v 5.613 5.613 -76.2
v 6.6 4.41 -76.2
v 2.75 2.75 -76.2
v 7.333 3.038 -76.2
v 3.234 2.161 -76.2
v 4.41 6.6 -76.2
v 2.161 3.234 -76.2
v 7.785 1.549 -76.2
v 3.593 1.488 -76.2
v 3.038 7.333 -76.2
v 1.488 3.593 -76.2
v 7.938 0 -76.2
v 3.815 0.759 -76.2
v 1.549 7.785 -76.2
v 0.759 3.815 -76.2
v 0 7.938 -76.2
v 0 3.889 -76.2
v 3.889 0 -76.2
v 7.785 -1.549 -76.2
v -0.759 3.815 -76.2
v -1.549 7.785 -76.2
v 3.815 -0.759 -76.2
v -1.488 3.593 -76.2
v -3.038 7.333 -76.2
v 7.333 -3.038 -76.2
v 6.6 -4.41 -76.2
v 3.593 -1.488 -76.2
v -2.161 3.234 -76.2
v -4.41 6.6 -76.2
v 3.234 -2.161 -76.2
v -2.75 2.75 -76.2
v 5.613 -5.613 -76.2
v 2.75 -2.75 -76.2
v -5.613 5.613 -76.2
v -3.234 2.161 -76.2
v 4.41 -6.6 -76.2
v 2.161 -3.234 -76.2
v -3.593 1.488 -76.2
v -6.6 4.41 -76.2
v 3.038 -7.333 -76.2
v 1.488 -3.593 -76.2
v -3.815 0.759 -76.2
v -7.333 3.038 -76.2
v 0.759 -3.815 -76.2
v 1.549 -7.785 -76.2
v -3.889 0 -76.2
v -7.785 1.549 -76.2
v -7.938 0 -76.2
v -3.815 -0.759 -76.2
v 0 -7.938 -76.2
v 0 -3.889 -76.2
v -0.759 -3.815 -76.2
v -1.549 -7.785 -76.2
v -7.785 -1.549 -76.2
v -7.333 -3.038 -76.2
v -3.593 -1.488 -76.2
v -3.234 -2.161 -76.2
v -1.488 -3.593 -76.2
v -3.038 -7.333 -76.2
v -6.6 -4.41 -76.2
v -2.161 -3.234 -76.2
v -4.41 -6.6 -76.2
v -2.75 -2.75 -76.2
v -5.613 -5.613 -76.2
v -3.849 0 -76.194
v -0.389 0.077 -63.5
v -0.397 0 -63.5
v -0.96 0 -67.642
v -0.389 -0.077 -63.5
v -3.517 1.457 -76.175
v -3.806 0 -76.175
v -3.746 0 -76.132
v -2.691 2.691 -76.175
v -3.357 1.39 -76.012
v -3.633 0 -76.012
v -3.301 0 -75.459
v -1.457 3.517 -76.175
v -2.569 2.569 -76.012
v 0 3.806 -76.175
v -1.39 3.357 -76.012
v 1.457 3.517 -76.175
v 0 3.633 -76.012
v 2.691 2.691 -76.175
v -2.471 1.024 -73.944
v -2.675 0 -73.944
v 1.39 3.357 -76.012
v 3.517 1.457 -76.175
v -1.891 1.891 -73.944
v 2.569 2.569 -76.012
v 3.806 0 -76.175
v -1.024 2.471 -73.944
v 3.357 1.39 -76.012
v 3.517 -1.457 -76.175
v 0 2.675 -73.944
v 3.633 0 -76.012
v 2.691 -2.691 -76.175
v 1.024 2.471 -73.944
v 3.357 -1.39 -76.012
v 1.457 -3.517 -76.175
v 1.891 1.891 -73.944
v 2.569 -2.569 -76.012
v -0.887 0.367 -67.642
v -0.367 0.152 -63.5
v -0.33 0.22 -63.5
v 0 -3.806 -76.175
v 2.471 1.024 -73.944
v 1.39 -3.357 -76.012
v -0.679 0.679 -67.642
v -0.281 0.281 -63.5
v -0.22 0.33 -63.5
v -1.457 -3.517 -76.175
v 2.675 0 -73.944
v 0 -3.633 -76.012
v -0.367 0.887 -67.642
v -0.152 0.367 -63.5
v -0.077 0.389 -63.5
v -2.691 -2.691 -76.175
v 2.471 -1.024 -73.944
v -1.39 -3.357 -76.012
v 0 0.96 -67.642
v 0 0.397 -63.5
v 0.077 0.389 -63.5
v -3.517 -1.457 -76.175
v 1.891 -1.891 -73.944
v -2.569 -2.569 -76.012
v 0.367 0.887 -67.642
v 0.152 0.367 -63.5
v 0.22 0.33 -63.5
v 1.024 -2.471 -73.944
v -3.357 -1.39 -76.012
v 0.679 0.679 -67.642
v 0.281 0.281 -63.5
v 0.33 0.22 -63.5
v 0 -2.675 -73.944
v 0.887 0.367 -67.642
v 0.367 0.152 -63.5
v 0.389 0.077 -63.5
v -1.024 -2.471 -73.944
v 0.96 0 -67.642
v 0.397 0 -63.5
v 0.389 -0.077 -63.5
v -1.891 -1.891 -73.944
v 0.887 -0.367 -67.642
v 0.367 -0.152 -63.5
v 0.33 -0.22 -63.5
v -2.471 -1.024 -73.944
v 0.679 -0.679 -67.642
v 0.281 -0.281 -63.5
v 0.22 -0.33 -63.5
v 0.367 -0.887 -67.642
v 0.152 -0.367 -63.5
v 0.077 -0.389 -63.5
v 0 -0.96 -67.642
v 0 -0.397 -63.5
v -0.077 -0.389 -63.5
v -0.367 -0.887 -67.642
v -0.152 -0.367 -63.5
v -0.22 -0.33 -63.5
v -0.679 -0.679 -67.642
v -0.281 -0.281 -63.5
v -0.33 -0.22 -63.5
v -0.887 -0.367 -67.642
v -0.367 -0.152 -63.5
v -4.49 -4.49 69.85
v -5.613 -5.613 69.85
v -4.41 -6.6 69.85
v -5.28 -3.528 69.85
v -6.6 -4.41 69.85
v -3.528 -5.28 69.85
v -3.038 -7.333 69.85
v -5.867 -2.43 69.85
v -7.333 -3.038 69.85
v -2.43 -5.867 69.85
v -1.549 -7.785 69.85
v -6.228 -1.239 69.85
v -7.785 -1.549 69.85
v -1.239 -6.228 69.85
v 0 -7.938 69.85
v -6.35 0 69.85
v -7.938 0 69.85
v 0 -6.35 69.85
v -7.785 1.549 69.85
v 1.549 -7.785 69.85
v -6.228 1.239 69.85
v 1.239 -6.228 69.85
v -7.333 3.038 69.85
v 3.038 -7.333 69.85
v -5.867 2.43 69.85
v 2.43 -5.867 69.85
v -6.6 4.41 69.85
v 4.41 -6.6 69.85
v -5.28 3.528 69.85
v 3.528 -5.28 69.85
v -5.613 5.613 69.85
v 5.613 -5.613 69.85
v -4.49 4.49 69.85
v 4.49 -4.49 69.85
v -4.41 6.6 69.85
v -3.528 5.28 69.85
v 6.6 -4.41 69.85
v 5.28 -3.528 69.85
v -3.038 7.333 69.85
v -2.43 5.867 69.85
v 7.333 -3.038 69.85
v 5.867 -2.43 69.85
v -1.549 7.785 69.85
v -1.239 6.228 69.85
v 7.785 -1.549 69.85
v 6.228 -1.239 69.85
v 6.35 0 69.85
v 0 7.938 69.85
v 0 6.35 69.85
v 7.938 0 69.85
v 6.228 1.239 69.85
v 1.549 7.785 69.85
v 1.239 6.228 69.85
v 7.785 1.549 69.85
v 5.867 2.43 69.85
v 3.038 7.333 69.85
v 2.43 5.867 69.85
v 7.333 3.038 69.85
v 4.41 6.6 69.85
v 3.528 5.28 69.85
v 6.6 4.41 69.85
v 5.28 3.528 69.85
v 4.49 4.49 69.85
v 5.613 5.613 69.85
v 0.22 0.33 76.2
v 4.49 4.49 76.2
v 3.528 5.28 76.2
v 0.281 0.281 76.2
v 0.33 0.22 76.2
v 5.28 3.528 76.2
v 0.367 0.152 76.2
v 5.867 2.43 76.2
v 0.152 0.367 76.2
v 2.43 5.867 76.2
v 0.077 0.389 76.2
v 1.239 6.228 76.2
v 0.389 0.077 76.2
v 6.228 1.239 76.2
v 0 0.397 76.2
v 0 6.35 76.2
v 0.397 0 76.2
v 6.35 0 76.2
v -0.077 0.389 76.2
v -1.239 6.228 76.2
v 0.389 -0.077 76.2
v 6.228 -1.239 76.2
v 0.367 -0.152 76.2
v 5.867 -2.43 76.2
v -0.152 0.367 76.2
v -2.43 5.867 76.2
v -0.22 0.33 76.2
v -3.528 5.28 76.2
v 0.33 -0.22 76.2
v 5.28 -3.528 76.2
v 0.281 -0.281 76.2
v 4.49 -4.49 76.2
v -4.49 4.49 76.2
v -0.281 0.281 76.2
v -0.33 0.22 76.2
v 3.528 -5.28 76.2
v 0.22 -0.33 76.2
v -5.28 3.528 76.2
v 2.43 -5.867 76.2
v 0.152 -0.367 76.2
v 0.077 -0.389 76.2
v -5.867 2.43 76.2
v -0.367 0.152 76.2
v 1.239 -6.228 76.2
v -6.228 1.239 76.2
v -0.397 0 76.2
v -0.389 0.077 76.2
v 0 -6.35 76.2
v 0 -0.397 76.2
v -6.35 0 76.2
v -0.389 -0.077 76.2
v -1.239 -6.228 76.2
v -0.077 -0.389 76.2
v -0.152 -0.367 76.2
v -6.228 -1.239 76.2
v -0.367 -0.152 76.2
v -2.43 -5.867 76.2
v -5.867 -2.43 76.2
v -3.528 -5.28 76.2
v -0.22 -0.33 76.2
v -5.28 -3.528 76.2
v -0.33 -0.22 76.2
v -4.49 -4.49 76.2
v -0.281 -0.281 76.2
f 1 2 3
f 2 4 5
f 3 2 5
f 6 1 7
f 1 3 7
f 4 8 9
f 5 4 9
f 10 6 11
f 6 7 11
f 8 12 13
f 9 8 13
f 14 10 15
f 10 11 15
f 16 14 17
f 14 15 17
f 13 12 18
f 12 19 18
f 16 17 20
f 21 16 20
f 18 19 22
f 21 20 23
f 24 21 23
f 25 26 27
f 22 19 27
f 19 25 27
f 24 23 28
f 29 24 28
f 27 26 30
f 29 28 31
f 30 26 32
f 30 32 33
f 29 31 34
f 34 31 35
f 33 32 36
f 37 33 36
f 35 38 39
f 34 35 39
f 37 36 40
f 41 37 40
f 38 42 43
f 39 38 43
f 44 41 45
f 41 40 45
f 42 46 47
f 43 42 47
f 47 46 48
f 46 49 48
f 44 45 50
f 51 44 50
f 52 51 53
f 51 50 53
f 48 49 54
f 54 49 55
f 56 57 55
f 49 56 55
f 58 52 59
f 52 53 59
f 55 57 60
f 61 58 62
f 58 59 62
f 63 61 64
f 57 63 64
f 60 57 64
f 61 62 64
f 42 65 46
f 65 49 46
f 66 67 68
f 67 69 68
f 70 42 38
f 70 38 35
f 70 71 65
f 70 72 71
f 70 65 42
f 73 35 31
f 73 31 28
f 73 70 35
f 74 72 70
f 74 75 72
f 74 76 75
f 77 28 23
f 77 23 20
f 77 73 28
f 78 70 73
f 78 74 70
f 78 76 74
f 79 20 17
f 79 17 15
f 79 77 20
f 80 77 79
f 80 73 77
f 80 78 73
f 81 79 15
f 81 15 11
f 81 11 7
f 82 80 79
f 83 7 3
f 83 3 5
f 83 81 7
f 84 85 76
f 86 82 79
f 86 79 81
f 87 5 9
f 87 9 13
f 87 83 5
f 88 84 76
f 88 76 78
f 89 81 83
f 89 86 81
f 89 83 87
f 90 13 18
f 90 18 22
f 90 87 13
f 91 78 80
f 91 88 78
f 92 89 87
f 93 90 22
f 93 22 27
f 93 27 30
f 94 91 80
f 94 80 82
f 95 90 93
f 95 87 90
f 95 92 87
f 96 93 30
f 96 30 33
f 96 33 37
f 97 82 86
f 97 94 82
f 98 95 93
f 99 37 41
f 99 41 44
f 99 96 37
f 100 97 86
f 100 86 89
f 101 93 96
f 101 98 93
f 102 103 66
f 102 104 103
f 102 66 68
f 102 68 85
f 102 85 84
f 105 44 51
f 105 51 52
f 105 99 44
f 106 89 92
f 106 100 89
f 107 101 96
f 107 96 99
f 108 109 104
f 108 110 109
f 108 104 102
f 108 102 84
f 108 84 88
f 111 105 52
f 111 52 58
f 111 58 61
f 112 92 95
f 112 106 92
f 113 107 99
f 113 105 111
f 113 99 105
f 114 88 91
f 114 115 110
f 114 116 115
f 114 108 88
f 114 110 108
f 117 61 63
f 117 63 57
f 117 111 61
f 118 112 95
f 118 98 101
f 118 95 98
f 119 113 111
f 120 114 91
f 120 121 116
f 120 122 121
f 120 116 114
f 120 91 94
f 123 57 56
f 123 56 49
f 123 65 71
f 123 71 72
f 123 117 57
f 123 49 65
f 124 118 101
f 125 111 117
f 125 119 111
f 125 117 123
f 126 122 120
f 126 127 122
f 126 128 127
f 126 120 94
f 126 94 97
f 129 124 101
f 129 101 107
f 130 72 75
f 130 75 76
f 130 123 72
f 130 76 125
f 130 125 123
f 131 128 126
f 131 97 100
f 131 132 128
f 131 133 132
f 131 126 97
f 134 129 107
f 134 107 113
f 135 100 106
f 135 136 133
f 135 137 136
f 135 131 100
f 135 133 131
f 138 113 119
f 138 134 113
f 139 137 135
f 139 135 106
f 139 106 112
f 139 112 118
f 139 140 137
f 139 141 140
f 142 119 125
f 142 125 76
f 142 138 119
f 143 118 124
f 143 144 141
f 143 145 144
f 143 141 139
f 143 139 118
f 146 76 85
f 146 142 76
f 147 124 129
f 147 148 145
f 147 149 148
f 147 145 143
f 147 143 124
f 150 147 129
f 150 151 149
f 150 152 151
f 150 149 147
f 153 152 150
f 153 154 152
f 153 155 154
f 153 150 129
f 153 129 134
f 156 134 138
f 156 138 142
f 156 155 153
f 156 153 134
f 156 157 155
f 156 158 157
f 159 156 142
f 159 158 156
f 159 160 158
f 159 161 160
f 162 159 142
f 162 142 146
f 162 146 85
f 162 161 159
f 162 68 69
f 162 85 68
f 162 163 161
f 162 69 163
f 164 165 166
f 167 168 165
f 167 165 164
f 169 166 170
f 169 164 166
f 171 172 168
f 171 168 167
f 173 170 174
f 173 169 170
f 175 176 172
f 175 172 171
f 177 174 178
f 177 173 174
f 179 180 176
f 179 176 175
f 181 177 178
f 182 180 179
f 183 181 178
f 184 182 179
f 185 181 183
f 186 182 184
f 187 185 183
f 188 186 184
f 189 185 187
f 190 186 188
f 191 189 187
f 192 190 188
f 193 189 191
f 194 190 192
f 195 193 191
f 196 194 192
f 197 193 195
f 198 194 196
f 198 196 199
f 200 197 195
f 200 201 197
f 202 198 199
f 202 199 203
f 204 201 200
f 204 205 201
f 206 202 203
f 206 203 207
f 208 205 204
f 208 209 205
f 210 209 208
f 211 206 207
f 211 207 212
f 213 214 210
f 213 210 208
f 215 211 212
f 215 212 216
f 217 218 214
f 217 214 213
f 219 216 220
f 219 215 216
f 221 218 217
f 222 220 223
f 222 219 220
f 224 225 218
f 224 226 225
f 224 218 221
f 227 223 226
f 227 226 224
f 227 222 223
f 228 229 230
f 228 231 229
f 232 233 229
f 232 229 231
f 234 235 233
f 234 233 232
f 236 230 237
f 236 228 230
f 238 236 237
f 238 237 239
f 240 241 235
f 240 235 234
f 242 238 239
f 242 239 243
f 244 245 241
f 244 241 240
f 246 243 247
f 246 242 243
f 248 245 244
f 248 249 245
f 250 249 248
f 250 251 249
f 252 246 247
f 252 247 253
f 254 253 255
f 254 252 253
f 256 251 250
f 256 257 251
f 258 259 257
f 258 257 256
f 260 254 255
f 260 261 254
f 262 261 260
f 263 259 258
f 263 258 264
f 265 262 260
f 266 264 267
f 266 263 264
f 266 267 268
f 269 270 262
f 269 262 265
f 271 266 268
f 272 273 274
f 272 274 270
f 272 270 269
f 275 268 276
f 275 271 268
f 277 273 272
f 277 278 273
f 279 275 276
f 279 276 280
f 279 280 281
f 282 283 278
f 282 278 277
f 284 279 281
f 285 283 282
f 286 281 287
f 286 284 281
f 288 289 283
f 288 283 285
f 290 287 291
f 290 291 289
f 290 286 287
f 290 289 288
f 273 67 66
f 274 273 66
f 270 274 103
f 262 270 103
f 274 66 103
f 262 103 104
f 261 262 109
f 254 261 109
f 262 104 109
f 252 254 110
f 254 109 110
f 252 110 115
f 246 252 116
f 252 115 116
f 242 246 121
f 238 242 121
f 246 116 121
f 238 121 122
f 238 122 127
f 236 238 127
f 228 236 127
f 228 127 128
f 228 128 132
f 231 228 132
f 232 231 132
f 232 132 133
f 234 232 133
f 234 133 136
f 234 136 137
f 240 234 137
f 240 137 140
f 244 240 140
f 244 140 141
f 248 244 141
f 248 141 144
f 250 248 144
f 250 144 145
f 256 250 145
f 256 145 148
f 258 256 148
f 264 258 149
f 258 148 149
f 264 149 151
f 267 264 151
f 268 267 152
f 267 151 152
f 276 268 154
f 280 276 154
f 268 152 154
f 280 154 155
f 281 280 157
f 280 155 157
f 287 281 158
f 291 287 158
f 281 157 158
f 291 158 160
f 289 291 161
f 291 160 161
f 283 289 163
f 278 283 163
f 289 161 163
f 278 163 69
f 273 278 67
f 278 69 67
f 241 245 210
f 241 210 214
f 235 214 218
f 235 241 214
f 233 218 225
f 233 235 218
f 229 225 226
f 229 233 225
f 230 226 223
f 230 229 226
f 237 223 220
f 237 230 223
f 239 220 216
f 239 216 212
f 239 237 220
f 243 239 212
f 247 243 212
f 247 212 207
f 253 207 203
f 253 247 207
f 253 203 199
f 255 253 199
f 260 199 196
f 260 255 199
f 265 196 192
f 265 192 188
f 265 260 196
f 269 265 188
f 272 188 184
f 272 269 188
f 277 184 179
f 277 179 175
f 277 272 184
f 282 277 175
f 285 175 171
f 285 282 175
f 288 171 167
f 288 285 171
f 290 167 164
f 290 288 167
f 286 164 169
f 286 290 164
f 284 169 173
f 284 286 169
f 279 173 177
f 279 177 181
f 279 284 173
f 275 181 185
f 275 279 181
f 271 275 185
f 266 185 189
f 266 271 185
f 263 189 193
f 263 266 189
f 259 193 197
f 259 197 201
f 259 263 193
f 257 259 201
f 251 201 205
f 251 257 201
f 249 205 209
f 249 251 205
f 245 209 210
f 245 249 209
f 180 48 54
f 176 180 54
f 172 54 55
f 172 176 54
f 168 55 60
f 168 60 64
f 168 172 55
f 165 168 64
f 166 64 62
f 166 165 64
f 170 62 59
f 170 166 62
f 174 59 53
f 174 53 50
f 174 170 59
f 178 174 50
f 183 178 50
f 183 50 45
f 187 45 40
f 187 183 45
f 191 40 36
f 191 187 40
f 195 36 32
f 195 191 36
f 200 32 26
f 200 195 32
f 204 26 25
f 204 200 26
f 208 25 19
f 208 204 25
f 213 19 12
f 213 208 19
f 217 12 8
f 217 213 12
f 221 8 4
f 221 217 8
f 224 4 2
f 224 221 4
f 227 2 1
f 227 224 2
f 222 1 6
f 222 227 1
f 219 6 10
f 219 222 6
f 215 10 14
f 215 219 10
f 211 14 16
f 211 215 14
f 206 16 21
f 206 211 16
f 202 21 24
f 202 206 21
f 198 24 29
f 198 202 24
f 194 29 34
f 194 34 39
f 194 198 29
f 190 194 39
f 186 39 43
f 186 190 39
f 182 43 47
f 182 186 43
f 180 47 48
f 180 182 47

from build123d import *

# Parameters (mm, degrees)
SKETCH3_R           = 7.9375
BOSS_EXTRUDE1_DEPTH = 76.2
SKETCH5_OUTSIDE_W   = 48.682
SKETCH5_OUTSIDE_H   = 48.682
SKETCH5_OUTSIDE_R   = 6.35
CUT_EXTRUDE1_DEPTH  = 6.35
SKETCH6_R           = 0.396875
CUT_EXTRUDE2_DEPTH  = 152.4
FILLET5_SIZE        = 3.4925
FILLET5_SIZE_2      = 12.7


with BuildPart() as part:
    # Sketch3 → Boss-Extrude1 (new, symmetric)
    with BuildSketch(Plane.XY):
        with Locations(Location((0, 0, 0), (0, 0, 180))):
            Circle(SKETCH3_R)
    extrude(amount=BOSS_EXTRUDE1_DEPTH, both=True)

    # Sketch5 outside → Cut-Extrude1 (cut)
    with BuildSketch(Plane.XY.offset(76.2)):
        Rectangle(SKETCH5_OUTSIDE_W, SKETCH5_OUTSIDE_H)
        Circle(SKETCH5_OUTSIDE_R, mode=Mode.SUBTRACT)
    extrude(amount=-CUT_EXTRUDE1_DEPTH, mode=Mode.SUBTRACT)

    # Sketch6 → Cut-Extrude2 (cut)
    with BuildSketch(Plane(origin=(0, 0, -76.2), x_dir=(-1, 0, 0), z_dir=(0, 0, -1))):
        Circle(SKETCH6_R)
    extrude(amount=-CUT_EXTRUDE2_DEPTH, mode=Mode.SUBTRACT)

    # Fillet5
    # a fillet whose section is not a circle: 12.7, 3.4925 mm, written as the material it takes off along each edge
    with BuildSketch(Plane(origin=(0, 0, -76.2), x_dir=(-1, 0, 0), z_dir=(0, -1, 0))) as fillet5_piece_1:
        with BuildLine():
            Bezier((0.396875 + FILLET5_SIZE, 0), (0.396875, 0), (0.396875, -FILLET5_SIZE_2), weights=[1, 0.25, 1])
            Line((0.396875, -FILLET5_SIZE_2), (0.396875, 0))
            Line((0.396875, 0), (0.396875 + FILLET5_SIZE, 0))
        make_face()
    revolve(axis=Axis((0, 0, -76.2), (0, 0, -1)), mode=Mode.SUBTRACT)


solid = part.part
